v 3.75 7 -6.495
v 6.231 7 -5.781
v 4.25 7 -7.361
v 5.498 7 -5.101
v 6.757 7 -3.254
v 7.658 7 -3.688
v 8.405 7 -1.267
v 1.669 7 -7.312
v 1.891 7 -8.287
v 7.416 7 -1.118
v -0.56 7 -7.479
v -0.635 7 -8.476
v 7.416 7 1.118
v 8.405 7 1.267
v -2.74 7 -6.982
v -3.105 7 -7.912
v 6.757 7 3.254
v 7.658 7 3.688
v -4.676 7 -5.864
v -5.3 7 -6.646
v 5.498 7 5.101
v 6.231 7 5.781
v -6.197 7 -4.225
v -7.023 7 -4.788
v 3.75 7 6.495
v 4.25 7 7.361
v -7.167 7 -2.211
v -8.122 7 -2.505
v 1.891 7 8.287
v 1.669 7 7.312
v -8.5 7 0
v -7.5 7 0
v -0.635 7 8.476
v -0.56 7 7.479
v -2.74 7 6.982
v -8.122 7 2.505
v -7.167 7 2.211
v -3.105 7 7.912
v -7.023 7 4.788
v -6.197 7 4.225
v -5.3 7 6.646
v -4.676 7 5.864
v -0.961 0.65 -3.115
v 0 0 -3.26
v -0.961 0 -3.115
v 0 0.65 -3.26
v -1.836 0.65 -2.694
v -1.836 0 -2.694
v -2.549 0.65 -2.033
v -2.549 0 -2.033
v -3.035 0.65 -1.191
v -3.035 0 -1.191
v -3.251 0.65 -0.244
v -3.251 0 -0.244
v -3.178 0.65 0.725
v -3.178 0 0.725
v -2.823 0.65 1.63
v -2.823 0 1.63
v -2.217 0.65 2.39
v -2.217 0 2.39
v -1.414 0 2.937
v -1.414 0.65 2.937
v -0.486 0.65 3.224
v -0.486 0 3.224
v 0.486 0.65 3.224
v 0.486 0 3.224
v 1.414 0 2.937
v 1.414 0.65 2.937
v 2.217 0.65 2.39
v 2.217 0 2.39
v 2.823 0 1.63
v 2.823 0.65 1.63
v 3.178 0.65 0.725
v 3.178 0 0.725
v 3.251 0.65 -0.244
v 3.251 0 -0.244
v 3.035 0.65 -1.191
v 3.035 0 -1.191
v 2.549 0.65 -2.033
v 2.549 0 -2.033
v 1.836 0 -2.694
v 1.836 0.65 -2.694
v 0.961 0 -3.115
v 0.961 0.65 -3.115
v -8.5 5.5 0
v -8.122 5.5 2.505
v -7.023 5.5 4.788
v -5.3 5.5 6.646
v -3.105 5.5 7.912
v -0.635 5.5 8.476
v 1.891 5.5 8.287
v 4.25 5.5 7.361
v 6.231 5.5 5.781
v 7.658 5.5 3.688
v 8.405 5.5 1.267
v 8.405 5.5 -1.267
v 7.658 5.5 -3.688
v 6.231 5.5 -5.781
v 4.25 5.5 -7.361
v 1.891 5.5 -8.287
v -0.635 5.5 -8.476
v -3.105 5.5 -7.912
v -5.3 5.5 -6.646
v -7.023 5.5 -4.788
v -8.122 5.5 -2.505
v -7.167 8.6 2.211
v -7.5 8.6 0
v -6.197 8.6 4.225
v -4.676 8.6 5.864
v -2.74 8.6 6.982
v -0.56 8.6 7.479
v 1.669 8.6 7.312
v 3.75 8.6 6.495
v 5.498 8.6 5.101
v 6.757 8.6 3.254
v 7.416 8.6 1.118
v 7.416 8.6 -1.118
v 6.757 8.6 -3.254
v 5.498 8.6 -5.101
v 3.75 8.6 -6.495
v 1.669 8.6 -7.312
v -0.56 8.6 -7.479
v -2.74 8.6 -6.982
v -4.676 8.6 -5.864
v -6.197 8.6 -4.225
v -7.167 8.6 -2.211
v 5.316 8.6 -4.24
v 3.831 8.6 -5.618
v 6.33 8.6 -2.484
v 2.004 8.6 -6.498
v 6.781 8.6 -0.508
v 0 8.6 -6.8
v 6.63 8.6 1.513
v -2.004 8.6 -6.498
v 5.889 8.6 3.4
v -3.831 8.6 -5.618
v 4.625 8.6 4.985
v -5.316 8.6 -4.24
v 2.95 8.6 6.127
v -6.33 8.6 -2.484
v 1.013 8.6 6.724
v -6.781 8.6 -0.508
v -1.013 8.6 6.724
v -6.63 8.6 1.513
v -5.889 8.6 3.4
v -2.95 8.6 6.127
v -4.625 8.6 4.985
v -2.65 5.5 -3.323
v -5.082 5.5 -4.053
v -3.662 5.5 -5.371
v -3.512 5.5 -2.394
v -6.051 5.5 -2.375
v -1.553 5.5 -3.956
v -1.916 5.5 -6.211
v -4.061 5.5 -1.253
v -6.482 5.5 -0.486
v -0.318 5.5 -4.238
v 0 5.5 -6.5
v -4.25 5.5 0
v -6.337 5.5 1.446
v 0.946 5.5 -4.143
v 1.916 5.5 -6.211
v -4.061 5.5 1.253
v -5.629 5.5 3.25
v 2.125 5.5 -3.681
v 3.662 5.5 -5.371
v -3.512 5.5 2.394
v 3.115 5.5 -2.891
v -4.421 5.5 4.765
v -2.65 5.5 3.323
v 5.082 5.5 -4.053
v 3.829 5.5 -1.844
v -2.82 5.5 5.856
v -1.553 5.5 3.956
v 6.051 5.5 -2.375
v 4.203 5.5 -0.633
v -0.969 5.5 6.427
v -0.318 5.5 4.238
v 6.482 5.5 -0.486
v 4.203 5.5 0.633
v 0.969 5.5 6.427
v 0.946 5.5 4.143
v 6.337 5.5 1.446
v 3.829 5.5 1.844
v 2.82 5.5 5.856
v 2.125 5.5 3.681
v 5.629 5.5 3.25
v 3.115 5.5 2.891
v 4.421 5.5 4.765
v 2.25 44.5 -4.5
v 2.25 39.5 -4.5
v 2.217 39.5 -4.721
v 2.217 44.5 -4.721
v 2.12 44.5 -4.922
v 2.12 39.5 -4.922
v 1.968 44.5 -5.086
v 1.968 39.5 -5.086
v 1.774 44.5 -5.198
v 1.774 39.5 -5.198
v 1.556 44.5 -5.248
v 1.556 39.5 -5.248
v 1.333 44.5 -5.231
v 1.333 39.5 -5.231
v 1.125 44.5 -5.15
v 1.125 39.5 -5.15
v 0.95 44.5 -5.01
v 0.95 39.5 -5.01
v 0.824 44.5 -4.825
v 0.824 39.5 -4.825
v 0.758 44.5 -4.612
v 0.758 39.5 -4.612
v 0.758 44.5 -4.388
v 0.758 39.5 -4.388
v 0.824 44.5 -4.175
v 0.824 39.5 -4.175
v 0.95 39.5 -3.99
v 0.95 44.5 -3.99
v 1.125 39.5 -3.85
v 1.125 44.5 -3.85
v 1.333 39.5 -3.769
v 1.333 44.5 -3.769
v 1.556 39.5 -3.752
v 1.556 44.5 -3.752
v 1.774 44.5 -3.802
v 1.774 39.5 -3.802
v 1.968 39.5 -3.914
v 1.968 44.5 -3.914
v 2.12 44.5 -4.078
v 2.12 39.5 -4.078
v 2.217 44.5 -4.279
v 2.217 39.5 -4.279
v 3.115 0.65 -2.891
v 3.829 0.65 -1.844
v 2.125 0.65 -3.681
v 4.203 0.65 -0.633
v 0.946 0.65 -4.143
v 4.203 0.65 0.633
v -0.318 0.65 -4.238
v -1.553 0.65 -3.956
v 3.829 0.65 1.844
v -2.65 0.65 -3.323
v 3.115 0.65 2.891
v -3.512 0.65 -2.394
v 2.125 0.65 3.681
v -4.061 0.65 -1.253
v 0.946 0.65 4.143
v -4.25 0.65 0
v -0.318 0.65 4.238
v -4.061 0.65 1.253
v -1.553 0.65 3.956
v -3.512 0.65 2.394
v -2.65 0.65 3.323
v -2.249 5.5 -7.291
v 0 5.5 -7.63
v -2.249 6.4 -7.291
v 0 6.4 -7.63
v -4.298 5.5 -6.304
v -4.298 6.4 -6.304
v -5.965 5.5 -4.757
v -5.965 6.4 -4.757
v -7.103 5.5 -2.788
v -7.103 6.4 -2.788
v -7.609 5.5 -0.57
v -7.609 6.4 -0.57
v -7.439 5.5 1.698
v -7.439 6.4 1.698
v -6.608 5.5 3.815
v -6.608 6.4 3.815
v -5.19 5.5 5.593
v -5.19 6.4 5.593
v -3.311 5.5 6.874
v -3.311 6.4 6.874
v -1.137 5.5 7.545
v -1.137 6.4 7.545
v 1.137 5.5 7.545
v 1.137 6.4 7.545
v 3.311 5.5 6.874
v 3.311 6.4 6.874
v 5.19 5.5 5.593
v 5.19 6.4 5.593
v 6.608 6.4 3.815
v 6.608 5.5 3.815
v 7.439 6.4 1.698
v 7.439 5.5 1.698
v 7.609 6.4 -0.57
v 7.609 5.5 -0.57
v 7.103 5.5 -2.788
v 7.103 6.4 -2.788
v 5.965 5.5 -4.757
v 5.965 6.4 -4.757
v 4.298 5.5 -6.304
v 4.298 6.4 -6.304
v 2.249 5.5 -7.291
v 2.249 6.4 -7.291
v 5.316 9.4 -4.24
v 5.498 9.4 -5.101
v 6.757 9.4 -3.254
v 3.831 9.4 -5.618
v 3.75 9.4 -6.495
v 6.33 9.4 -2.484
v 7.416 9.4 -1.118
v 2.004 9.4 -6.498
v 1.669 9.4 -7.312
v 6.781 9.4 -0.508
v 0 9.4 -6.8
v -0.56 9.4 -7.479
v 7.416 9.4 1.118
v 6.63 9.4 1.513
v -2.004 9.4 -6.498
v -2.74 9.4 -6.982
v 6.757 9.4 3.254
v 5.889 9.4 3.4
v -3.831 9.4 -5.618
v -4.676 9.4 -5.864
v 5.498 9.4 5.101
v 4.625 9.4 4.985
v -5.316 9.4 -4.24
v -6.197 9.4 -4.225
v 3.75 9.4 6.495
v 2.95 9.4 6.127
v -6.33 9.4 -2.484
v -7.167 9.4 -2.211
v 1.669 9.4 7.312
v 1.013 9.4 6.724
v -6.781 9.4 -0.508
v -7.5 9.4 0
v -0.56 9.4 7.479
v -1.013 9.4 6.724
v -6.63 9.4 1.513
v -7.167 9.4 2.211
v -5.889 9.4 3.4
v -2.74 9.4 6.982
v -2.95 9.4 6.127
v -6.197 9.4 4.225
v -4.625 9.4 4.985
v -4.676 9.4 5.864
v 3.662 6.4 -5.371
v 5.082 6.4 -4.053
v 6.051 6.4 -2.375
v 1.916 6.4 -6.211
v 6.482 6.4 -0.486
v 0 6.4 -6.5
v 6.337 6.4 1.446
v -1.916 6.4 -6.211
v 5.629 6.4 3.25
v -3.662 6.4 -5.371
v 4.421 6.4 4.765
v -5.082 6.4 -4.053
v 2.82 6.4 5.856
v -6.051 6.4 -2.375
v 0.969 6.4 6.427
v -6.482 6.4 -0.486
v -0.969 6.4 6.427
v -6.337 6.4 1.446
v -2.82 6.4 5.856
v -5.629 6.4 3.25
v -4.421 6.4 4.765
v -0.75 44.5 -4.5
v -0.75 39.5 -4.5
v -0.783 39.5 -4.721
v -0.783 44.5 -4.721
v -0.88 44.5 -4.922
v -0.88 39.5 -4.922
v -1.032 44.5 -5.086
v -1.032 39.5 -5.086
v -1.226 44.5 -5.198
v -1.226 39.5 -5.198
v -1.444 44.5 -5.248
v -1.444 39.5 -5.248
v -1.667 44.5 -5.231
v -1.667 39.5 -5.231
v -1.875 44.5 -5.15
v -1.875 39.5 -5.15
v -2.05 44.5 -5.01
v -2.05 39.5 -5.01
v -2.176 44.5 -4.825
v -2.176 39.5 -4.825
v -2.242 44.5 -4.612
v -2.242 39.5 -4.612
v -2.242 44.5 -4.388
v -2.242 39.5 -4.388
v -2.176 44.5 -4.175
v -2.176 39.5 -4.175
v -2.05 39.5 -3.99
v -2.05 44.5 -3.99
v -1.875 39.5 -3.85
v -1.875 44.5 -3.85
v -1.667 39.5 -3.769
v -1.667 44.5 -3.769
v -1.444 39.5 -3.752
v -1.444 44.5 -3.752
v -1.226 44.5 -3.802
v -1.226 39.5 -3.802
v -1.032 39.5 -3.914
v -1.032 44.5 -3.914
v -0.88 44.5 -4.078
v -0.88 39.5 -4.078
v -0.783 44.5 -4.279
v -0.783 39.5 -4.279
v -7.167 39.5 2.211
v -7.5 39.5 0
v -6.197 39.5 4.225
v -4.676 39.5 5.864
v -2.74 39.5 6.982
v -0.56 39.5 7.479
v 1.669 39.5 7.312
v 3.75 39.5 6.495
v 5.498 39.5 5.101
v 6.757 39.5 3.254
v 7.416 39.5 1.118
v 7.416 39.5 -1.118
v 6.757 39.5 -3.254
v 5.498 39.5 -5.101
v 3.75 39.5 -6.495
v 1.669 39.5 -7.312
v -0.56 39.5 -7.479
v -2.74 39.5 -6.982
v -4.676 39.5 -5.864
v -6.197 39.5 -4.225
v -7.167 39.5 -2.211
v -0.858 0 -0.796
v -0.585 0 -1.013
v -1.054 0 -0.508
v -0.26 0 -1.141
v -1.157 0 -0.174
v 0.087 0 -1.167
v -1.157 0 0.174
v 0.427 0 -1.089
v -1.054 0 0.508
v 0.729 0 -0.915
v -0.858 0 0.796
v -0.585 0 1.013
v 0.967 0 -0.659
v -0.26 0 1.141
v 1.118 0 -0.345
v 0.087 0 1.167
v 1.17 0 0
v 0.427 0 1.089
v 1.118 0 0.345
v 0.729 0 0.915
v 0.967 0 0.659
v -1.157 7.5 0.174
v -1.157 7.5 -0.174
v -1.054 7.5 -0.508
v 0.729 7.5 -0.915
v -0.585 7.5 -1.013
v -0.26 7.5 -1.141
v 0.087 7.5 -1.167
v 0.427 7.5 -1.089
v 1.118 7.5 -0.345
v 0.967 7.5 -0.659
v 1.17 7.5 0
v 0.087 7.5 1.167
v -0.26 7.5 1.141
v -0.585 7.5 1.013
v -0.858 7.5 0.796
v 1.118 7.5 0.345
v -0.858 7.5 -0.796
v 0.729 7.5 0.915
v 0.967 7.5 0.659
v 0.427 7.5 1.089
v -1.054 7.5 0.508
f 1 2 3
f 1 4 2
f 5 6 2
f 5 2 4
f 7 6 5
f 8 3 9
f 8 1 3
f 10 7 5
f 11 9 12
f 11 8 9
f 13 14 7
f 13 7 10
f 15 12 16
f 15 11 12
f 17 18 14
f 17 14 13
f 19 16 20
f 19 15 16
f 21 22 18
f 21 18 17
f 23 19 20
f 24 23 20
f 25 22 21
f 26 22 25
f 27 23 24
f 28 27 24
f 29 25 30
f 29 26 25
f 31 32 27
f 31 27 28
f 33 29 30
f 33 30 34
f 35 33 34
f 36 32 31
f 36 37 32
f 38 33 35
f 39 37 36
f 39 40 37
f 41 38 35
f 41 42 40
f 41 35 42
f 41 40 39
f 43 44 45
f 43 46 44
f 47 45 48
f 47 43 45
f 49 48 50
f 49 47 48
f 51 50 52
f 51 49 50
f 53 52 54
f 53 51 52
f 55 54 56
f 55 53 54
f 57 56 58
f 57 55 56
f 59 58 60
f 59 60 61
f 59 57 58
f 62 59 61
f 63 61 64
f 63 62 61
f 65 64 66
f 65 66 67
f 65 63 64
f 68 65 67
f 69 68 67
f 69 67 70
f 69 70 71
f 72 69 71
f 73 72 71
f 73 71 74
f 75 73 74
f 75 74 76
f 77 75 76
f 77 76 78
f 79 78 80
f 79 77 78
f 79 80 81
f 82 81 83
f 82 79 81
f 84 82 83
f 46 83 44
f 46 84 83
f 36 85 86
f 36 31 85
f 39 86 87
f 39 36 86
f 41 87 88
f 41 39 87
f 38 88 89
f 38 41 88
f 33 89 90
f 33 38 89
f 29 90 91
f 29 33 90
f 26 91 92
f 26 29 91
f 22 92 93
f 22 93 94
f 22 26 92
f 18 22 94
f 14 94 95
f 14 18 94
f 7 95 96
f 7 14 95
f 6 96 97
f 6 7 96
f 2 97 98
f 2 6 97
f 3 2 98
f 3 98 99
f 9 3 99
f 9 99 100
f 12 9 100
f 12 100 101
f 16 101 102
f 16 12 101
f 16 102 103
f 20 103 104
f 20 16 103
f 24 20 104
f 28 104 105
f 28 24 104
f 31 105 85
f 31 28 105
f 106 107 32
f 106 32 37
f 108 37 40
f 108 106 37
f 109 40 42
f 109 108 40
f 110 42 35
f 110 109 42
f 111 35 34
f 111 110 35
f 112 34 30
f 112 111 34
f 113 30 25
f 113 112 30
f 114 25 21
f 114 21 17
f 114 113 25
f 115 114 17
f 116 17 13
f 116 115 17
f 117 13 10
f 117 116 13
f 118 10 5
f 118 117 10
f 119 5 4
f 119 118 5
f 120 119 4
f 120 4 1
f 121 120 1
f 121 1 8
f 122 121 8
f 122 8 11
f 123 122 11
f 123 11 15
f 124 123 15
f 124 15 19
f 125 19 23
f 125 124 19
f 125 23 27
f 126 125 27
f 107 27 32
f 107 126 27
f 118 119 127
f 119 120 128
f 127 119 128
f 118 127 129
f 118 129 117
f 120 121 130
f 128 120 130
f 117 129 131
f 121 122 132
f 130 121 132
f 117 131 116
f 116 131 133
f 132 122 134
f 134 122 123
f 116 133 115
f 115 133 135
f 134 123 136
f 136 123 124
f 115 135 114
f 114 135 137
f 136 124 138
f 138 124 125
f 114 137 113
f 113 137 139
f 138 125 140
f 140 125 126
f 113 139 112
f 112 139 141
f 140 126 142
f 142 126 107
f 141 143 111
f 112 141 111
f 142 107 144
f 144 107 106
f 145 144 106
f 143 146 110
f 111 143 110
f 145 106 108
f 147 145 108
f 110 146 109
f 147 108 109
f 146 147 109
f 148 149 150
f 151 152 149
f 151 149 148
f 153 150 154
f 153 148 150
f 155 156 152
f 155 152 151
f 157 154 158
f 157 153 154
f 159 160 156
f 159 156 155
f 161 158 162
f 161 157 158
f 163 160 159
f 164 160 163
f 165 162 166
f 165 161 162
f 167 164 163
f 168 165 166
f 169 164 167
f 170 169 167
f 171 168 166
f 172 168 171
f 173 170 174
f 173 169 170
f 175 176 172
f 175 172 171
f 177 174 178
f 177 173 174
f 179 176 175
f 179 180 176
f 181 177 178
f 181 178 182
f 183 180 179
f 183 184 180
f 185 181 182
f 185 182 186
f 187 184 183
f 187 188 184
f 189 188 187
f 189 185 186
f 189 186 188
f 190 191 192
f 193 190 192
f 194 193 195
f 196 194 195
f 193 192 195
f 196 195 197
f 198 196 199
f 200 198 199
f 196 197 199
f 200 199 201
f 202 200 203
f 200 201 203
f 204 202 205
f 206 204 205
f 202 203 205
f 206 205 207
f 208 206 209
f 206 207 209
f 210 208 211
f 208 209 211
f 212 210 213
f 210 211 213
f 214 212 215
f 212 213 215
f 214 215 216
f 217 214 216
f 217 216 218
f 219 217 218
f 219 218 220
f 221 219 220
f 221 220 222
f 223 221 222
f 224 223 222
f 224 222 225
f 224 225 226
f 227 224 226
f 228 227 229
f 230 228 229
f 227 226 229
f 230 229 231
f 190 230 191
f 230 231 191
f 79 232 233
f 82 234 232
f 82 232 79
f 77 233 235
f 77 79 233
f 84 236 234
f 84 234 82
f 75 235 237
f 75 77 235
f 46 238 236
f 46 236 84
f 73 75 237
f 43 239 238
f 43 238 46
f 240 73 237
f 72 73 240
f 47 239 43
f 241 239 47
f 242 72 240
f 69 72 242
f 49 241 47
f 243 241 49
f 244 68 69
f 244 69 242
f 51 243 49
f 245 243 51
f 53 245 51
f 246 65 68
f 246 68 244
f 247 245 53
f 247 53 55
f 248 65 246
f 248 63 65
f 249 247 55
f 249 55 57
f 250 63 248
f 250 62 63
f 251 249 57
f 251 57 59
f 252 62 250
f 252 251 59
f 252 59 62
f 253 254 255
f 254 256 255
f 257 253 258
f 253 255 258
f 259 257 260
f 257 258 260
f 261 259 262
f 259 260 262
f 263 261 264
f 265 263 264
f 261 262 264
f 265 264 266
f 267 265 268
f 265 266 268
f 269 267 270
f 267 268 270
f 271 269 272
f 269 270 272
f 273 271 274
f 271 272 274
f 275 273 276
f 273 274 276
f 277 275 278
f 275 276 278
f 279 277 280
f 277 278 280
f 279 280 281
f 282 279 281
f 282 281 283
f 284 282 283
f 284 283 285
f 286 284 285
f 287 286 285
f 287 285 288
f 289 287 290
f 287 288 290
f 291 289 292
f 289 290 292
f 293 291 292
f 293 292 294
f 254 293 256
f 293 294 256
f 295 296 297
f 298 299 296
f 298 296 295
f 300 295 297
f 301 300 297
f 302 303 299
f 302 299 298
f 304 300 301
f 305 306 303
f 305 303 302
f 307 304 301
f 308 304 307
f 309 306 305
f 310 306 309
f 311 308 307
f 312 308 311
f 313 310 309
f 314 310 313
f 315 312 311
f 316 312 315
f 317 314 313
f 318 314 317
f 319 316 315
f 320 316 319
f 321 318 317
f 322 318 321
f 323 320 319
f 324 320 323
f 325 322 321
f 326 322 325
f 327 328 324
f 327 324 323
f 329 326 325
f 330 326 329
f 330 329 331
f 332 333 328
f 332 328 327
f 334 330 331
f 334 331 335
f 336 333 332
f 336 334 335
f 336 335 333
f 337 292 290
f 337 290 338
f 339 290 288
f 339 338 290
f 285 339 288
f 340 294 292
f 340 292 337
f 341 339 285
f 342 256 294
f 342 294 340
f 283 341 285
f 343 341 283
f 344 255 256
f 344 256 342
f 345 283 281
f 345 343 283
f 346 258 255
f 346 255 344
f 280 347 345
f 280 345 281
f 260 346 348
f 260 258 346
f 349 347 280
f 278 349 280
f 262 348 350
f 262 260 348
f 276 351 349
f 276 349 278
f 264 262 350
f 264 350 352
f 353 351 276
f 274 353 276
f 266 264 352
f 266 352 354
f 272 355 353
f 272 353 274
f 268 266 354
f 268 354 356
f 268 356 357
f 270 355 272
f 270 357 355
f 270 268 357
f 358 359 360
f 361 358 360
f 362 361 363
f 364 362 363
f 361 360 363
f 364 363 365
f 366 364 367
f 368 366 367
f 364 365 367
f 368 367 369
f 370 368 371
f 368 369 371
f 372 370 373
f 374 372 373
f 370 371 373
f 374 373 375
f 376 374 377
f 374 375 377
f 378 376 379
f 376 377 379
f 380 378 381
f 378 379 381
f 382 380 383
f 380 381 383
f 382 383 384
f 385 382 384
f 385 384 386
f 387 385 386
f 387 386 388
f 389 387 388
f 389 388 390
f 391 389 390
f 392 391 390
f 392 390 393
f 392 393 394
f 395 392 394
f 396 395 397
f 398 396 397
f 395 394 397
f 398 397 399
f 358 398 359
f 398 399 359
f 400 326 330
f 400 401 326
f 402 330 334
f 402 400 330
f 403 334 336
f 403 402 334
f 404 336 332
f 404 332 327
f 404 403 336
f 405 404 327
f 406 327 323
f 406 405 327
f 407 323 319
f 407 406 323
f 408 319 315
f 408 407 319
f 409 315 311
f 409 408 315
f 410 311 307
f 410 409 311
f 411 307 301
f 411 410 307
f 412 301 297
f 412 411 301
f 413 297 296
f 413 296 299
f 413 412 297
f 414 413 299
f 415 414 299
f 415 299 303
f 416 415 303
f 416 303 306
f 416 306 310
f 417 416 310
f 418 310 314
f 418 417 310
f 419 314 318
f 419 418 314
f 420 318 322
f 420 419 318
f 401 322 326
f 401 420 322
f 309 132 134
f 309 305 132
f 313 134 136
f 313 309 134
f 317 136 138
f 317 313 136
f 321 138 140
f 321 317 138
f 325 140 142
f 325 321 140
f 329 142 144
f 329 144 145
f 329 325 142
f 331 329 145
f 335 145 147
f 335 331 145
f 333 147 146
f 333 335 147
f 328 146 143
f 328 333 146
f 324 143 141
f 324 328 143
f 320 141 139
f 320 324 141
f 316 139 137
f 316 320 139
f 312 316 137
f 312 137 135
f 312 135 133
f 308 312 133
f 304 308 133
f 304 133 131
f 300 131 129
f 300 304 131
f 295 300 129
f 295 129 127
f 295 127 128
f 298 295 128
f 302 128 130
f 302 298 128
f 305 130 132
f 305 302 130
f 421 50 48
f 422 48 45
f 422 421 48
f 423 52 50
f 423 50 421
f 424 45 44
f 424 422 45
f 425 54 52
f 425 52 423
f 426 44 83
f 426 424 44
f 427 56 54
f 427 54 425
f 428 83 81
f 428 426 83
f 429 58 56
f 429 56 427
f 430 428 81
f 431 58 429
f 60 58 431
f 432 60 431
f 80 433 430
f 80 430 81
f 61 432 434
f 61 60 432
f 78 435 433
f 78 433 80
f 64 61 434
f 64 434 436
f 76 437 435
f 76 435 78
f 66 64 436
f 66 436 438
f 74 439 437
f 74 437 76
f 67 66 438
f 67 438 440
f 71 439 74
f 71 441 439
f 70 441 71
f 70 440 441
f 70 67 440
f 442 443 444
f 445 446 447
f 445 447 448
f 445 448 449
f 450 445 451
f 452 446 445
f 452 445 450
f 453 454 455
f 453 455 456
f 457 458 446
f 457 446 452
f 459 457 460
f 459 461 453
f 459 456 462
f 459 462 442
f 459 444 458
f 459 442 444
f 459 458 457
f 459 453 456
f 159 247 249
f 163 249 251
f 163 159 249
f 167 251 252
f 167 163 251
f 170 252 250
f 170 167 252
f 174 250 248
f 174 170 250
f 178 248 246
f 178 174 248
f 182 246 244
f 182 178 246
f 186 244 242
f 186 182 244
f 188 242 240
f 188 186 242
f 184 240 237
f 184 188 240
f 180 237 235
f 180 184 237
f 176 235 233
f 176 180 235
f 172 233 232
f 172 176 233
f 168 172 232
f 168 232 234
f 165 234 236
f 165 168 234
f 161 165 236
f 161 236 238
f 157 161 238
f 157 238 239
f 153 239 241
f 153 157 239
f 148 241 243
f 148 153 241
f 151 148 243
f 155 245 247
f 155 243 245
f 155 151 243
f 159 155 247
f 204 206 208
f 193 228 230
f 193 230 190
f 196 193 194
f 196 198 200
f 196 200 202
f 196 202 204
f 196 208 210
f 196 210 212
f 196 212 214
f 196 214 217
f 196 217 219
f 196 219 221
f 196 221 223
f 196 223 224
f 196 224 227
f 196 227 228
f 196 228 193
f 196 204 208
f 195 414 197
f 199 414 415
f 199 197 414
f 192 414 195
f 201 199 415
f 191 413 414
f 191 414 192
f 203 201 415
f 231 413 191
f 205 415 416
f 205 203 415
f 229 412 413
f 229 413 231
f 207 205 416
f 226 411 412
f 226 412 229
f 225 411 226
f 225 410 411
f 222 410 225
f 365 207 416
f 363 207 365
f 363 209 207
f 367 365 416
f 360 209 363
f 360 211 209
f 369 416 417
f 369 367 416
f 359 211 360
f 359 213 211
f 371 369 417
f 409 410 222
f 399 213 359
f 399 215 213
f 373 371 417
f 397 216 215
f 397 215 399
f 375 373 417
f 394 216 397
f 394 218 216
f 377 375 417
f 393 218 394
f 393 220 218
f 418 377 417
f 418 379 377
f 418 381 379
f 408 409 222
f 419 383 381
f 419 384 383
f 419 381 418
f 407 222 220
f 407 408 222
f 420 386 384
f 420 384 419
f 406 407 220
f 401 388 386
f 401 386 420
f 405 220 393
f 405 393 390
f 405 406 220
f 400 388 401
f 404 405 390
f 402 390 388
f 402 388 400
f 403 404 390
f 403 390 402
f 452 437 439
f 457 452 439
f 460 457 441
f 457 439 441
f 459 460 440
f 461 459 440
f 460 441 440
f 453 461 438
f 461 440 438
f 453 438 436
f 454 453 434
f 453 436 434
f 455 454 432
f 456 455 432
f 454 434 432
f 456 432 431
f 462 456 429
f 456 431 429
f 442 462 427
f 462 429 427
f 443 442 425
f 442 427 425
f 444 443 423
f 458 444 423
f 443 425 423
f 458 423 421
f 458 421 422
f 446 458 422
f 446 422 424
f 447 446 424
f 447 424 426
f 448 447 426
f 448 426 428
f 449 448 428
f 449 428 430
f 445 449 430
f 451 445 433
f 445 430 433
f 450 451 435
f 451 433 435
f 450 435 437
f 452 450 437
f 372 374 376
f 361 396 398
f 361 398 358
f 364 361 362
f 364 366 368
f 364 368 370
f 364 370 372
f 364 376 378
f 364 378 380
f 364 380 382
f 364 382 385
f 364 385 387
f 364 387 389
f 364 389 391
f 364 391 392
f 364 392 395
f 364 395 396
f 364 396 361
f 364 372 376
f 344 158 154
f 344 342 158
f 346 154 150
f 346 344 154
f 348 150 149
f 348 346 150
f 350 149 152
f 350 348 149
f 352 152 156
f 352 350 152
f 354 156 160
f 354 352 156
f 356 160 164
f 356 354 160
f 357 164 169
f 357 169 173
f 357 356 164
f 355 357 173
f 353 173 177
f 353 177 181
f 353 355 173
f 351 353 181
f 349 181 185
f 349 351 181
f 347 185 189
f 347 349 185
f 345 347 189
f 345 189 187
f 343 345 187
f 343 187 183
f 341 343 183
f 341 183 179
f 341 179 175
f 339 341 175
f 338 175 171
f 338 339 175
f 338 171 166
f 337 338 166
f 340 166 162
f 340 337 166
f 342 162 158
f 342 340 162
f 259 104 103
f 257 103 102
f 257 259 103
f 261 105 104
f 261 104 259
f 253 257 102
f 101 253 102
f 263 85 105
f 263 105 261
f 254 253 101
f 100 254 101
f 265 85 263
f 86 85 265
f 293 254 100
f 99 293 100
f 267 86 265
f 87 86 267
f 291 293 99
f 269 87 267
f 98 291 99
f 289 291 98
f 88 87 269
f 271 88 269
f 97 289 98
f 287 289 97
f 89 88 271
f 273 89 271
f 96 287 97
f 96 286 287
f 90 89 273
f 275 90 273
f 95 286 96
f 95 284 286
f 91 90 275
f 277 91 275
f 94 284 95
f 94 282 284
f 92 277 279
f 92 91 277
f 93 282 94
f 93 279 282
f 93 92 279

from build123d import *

# Parameters (mm, degrees)
SKETCH2_R           = 0.75
BOSS_EXTRUDE1_DEPTH = 5
SKETCH3_W           = 0.99
SKETCH3_H           = 0.65
SKETCH4_R           = 1.17
CUT_EXTRUDE1_DEPTH  = 7.5
SKETCH5_W           = 1.13
SKETCH5_H           = 0.9
SKETCH_N_W          = 0.8
SKETCH_N_H          = 0.8


with BuildPart() as part:
    # Sketch1 → Revolve2 (revolve)
    with BuildSketch(Plane.XY):
        Polygon((0, 0), (-4.25, 0), (-4.25, 5.5), (-8.5, 5.5), (-8.5, 7), (-7.5, 7), (-7.5, 39.5), (0, 39.5), align=None)
    revolve(axis=Axis((0, 0, 0), (0, 1, 0)))

    # Sketch2 → Boss-Extrude1 (add)
    with BuildSketch(Plane(origin=(0, 39.5, 0), x_dir=(1, 0, 0), z_dir=(0, 1, 0))):
        with Locations((1.5, 4.5)):
            Circle(SKETCH2_R)
        with Locations((-1.5, 4.5)):
            Circle(SKETCH2_R)
    extrude(amount=BOSS_EXTRUDE1_DEPTH)

    # Sketch3 → Cut-Revolve1 (revolve, cut)
    with BuildSketch(Plane(origin=(0, 0, 0), x_dir=(0, 0, -1), z_dir=(1, 0, 0))):
        with Locations((3.755, 0.325)):
            Rectangle(SKETCH3_W, SKETCH3_H)
    revolve(axis=Axis((0, 0, 0), (0, 1, 0)), mode=Mode.SUBTRACT)

    # Sketch4 → Cut-Extrude1 (cut)
    with BuildSketch(Plane.XZ):
        Circle(SKETCH4_R)
    extrude(amount=-CUT_EXTRUDE1_DEPTH, mode=Mode.SUBTRACT)

    # Sketch5 → Cut-Revolve2 (revolve, cut)
    with BuildSketch(Plane(origin=(0, 0, 0), x_dir=(0, 0, -1), z_dir=(1, 0, 0))):
        with Locations((7.065, 5.95)):
            Rectangle(SKETCH5_W, SKETCH5_H)
    revolve(axis=Axis((0, 0, 0), (0, 1, 0)), mode=Mode.SUBTRACT)

    # Sketch N → Cut-Revolve8 (revolve, cut)
    with BuildSketch(Plane(origin=(0, 0, 0), x_dir=(0, 0, -1), z_dir=(1, 0, 0))):
        with Locations((7.2, 9)):
            Rectangle(SKETCH_N_W, SKETCH_N_H)
    revolve(axis=Axis((0, 0, 0), (0, 1, 0)), mode=Mode.SUBTRACT)


solid = part.part
